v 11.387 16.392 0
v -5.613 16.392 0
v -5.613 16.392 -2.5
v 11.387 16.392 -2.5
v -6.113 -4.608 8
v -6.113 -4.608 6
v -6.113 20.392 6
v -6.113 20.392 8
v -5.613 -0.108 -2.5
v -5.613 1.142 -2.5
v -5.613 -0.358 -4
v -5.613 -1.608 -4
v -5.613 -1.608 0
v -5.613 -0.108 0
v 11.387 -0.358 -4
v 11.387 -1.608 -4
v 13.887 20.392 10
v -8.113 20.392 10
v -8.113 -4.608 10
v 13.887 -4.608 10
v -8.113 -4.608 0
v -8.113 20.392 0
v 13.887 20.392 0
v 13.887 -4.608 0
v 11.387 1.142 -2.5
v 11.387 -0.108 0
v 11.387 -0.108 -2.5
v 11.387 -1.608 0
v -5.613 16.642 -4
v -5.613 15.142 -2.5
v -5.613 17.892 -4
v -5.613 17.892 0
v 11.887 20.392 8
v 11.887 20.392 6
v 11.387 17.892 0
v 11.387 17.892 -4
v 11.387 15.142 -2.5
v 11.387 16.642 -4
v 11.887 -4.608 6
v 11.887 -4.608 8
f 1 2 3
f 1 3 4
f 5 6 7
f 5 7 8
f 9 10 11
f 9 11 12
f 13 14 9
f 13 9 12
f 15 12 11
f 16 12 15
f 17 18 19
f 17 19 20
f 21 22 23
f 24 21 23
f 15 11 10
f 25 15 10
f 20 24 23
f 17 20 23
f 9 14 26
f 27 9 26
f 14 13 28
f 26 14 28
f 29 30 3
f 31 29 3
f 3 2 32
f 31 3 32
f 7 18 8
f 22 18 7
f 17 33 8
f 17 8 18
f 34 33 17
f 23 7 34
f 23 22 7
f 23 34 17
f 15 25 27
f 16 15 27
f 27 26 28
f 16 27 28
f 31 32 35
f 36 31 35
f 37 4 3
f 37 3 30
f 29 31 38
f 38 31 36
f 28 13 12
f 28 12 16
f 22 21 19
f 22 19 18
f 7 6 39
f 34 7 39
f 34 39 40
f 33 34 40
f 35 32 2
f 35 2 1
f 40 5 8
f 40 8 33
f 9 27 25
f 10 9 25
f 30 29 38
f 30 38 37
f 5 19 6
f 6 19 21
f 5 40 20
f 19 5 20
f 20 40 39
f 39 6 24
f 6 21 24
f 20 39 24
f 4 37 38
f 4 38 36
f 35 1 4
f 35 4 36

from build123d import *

# Parameters (mm, degrees)
F0_W     = 22
F0_H     = 25
F1_DEPTH = 10
F2_W     = 18
F2_H     = 2
F3_DEPTH = 25
F4_W     = 17
F4_H     = 1.5
F5_DEPTH = 4
F7_DEPTH = 17
F8_DEPTH = 17


with BuildPart() as f1:
    # F0 (on Top) → F1 (new body)
    with BuildSketch(Plane.XY):
        with Locations((2.886561, 7.892089)):
            Rectangle(F0_W, F0_H)
    extrude(amount=F1_DEPTH)

    # F2 (on face) → F3 (cut, through all)
    with BuildSketch(Plane.XZ.offset(4.607911)):
        with Locations((2.886561, 7)):
            Rectangle(F2_W, F2_H)
    extrude(amount=-F3_DEPTH, mode=Mode.SUBTRACT)


with BuildPart() as f5:
    # F4 (on face) → F5 (new body)
    with BuildSketch(Plane(origin=(0, 0, 0), x_dir=(1, 0, 0), z_dir=(0, 0, -1))):
        with Locations((2.886561, 0.857911)):
            Rectangle(F4_W, F4_H)
    extrude(amount=F5_DEPTH)

    # F6 (on face) → F7 (join, through all)
    with BuildSketch(Plane(origin=(-5.613439, 0, 0), x_dir=(0, -1, 0), z_dir=(-1, 0, 0))):
        Polygon((0.107911, -3.75), (0.107911, -2.5), (-1.142089, -2.5), align=None)
    extrude(amount=-F7_DEPTH)

    # F6 (on face) → F8 (cut, through all)
    with BuildSketch(Plane(origin=(-5.613439, 0, 0), x_dir=(0, -1, 0), z_dir=(-1, 0, 0))):
        Polygon((0.357911, -4), (0.107911, -3.75), (0.107911, -4), align=None)
    extrude(amount=-F8_DEPTH, mode=Mode.SUBTRACT)


with BuildPart() as f9_1:
    # F9: instance of F5
    add(f5.part.mirror(Plane(origin=(2.886561, -0.107911, -1.25), x_dir=(-1, 0, 0), z_dir=(0, 1, 0))))


with BuildPart() as f9_1_1:
    # F10: moved
    add(f9_1.part.moved(Location((0, 16.5, 0))))


solid = Compound([f1.part, f5.part, f9_1_1.part])
